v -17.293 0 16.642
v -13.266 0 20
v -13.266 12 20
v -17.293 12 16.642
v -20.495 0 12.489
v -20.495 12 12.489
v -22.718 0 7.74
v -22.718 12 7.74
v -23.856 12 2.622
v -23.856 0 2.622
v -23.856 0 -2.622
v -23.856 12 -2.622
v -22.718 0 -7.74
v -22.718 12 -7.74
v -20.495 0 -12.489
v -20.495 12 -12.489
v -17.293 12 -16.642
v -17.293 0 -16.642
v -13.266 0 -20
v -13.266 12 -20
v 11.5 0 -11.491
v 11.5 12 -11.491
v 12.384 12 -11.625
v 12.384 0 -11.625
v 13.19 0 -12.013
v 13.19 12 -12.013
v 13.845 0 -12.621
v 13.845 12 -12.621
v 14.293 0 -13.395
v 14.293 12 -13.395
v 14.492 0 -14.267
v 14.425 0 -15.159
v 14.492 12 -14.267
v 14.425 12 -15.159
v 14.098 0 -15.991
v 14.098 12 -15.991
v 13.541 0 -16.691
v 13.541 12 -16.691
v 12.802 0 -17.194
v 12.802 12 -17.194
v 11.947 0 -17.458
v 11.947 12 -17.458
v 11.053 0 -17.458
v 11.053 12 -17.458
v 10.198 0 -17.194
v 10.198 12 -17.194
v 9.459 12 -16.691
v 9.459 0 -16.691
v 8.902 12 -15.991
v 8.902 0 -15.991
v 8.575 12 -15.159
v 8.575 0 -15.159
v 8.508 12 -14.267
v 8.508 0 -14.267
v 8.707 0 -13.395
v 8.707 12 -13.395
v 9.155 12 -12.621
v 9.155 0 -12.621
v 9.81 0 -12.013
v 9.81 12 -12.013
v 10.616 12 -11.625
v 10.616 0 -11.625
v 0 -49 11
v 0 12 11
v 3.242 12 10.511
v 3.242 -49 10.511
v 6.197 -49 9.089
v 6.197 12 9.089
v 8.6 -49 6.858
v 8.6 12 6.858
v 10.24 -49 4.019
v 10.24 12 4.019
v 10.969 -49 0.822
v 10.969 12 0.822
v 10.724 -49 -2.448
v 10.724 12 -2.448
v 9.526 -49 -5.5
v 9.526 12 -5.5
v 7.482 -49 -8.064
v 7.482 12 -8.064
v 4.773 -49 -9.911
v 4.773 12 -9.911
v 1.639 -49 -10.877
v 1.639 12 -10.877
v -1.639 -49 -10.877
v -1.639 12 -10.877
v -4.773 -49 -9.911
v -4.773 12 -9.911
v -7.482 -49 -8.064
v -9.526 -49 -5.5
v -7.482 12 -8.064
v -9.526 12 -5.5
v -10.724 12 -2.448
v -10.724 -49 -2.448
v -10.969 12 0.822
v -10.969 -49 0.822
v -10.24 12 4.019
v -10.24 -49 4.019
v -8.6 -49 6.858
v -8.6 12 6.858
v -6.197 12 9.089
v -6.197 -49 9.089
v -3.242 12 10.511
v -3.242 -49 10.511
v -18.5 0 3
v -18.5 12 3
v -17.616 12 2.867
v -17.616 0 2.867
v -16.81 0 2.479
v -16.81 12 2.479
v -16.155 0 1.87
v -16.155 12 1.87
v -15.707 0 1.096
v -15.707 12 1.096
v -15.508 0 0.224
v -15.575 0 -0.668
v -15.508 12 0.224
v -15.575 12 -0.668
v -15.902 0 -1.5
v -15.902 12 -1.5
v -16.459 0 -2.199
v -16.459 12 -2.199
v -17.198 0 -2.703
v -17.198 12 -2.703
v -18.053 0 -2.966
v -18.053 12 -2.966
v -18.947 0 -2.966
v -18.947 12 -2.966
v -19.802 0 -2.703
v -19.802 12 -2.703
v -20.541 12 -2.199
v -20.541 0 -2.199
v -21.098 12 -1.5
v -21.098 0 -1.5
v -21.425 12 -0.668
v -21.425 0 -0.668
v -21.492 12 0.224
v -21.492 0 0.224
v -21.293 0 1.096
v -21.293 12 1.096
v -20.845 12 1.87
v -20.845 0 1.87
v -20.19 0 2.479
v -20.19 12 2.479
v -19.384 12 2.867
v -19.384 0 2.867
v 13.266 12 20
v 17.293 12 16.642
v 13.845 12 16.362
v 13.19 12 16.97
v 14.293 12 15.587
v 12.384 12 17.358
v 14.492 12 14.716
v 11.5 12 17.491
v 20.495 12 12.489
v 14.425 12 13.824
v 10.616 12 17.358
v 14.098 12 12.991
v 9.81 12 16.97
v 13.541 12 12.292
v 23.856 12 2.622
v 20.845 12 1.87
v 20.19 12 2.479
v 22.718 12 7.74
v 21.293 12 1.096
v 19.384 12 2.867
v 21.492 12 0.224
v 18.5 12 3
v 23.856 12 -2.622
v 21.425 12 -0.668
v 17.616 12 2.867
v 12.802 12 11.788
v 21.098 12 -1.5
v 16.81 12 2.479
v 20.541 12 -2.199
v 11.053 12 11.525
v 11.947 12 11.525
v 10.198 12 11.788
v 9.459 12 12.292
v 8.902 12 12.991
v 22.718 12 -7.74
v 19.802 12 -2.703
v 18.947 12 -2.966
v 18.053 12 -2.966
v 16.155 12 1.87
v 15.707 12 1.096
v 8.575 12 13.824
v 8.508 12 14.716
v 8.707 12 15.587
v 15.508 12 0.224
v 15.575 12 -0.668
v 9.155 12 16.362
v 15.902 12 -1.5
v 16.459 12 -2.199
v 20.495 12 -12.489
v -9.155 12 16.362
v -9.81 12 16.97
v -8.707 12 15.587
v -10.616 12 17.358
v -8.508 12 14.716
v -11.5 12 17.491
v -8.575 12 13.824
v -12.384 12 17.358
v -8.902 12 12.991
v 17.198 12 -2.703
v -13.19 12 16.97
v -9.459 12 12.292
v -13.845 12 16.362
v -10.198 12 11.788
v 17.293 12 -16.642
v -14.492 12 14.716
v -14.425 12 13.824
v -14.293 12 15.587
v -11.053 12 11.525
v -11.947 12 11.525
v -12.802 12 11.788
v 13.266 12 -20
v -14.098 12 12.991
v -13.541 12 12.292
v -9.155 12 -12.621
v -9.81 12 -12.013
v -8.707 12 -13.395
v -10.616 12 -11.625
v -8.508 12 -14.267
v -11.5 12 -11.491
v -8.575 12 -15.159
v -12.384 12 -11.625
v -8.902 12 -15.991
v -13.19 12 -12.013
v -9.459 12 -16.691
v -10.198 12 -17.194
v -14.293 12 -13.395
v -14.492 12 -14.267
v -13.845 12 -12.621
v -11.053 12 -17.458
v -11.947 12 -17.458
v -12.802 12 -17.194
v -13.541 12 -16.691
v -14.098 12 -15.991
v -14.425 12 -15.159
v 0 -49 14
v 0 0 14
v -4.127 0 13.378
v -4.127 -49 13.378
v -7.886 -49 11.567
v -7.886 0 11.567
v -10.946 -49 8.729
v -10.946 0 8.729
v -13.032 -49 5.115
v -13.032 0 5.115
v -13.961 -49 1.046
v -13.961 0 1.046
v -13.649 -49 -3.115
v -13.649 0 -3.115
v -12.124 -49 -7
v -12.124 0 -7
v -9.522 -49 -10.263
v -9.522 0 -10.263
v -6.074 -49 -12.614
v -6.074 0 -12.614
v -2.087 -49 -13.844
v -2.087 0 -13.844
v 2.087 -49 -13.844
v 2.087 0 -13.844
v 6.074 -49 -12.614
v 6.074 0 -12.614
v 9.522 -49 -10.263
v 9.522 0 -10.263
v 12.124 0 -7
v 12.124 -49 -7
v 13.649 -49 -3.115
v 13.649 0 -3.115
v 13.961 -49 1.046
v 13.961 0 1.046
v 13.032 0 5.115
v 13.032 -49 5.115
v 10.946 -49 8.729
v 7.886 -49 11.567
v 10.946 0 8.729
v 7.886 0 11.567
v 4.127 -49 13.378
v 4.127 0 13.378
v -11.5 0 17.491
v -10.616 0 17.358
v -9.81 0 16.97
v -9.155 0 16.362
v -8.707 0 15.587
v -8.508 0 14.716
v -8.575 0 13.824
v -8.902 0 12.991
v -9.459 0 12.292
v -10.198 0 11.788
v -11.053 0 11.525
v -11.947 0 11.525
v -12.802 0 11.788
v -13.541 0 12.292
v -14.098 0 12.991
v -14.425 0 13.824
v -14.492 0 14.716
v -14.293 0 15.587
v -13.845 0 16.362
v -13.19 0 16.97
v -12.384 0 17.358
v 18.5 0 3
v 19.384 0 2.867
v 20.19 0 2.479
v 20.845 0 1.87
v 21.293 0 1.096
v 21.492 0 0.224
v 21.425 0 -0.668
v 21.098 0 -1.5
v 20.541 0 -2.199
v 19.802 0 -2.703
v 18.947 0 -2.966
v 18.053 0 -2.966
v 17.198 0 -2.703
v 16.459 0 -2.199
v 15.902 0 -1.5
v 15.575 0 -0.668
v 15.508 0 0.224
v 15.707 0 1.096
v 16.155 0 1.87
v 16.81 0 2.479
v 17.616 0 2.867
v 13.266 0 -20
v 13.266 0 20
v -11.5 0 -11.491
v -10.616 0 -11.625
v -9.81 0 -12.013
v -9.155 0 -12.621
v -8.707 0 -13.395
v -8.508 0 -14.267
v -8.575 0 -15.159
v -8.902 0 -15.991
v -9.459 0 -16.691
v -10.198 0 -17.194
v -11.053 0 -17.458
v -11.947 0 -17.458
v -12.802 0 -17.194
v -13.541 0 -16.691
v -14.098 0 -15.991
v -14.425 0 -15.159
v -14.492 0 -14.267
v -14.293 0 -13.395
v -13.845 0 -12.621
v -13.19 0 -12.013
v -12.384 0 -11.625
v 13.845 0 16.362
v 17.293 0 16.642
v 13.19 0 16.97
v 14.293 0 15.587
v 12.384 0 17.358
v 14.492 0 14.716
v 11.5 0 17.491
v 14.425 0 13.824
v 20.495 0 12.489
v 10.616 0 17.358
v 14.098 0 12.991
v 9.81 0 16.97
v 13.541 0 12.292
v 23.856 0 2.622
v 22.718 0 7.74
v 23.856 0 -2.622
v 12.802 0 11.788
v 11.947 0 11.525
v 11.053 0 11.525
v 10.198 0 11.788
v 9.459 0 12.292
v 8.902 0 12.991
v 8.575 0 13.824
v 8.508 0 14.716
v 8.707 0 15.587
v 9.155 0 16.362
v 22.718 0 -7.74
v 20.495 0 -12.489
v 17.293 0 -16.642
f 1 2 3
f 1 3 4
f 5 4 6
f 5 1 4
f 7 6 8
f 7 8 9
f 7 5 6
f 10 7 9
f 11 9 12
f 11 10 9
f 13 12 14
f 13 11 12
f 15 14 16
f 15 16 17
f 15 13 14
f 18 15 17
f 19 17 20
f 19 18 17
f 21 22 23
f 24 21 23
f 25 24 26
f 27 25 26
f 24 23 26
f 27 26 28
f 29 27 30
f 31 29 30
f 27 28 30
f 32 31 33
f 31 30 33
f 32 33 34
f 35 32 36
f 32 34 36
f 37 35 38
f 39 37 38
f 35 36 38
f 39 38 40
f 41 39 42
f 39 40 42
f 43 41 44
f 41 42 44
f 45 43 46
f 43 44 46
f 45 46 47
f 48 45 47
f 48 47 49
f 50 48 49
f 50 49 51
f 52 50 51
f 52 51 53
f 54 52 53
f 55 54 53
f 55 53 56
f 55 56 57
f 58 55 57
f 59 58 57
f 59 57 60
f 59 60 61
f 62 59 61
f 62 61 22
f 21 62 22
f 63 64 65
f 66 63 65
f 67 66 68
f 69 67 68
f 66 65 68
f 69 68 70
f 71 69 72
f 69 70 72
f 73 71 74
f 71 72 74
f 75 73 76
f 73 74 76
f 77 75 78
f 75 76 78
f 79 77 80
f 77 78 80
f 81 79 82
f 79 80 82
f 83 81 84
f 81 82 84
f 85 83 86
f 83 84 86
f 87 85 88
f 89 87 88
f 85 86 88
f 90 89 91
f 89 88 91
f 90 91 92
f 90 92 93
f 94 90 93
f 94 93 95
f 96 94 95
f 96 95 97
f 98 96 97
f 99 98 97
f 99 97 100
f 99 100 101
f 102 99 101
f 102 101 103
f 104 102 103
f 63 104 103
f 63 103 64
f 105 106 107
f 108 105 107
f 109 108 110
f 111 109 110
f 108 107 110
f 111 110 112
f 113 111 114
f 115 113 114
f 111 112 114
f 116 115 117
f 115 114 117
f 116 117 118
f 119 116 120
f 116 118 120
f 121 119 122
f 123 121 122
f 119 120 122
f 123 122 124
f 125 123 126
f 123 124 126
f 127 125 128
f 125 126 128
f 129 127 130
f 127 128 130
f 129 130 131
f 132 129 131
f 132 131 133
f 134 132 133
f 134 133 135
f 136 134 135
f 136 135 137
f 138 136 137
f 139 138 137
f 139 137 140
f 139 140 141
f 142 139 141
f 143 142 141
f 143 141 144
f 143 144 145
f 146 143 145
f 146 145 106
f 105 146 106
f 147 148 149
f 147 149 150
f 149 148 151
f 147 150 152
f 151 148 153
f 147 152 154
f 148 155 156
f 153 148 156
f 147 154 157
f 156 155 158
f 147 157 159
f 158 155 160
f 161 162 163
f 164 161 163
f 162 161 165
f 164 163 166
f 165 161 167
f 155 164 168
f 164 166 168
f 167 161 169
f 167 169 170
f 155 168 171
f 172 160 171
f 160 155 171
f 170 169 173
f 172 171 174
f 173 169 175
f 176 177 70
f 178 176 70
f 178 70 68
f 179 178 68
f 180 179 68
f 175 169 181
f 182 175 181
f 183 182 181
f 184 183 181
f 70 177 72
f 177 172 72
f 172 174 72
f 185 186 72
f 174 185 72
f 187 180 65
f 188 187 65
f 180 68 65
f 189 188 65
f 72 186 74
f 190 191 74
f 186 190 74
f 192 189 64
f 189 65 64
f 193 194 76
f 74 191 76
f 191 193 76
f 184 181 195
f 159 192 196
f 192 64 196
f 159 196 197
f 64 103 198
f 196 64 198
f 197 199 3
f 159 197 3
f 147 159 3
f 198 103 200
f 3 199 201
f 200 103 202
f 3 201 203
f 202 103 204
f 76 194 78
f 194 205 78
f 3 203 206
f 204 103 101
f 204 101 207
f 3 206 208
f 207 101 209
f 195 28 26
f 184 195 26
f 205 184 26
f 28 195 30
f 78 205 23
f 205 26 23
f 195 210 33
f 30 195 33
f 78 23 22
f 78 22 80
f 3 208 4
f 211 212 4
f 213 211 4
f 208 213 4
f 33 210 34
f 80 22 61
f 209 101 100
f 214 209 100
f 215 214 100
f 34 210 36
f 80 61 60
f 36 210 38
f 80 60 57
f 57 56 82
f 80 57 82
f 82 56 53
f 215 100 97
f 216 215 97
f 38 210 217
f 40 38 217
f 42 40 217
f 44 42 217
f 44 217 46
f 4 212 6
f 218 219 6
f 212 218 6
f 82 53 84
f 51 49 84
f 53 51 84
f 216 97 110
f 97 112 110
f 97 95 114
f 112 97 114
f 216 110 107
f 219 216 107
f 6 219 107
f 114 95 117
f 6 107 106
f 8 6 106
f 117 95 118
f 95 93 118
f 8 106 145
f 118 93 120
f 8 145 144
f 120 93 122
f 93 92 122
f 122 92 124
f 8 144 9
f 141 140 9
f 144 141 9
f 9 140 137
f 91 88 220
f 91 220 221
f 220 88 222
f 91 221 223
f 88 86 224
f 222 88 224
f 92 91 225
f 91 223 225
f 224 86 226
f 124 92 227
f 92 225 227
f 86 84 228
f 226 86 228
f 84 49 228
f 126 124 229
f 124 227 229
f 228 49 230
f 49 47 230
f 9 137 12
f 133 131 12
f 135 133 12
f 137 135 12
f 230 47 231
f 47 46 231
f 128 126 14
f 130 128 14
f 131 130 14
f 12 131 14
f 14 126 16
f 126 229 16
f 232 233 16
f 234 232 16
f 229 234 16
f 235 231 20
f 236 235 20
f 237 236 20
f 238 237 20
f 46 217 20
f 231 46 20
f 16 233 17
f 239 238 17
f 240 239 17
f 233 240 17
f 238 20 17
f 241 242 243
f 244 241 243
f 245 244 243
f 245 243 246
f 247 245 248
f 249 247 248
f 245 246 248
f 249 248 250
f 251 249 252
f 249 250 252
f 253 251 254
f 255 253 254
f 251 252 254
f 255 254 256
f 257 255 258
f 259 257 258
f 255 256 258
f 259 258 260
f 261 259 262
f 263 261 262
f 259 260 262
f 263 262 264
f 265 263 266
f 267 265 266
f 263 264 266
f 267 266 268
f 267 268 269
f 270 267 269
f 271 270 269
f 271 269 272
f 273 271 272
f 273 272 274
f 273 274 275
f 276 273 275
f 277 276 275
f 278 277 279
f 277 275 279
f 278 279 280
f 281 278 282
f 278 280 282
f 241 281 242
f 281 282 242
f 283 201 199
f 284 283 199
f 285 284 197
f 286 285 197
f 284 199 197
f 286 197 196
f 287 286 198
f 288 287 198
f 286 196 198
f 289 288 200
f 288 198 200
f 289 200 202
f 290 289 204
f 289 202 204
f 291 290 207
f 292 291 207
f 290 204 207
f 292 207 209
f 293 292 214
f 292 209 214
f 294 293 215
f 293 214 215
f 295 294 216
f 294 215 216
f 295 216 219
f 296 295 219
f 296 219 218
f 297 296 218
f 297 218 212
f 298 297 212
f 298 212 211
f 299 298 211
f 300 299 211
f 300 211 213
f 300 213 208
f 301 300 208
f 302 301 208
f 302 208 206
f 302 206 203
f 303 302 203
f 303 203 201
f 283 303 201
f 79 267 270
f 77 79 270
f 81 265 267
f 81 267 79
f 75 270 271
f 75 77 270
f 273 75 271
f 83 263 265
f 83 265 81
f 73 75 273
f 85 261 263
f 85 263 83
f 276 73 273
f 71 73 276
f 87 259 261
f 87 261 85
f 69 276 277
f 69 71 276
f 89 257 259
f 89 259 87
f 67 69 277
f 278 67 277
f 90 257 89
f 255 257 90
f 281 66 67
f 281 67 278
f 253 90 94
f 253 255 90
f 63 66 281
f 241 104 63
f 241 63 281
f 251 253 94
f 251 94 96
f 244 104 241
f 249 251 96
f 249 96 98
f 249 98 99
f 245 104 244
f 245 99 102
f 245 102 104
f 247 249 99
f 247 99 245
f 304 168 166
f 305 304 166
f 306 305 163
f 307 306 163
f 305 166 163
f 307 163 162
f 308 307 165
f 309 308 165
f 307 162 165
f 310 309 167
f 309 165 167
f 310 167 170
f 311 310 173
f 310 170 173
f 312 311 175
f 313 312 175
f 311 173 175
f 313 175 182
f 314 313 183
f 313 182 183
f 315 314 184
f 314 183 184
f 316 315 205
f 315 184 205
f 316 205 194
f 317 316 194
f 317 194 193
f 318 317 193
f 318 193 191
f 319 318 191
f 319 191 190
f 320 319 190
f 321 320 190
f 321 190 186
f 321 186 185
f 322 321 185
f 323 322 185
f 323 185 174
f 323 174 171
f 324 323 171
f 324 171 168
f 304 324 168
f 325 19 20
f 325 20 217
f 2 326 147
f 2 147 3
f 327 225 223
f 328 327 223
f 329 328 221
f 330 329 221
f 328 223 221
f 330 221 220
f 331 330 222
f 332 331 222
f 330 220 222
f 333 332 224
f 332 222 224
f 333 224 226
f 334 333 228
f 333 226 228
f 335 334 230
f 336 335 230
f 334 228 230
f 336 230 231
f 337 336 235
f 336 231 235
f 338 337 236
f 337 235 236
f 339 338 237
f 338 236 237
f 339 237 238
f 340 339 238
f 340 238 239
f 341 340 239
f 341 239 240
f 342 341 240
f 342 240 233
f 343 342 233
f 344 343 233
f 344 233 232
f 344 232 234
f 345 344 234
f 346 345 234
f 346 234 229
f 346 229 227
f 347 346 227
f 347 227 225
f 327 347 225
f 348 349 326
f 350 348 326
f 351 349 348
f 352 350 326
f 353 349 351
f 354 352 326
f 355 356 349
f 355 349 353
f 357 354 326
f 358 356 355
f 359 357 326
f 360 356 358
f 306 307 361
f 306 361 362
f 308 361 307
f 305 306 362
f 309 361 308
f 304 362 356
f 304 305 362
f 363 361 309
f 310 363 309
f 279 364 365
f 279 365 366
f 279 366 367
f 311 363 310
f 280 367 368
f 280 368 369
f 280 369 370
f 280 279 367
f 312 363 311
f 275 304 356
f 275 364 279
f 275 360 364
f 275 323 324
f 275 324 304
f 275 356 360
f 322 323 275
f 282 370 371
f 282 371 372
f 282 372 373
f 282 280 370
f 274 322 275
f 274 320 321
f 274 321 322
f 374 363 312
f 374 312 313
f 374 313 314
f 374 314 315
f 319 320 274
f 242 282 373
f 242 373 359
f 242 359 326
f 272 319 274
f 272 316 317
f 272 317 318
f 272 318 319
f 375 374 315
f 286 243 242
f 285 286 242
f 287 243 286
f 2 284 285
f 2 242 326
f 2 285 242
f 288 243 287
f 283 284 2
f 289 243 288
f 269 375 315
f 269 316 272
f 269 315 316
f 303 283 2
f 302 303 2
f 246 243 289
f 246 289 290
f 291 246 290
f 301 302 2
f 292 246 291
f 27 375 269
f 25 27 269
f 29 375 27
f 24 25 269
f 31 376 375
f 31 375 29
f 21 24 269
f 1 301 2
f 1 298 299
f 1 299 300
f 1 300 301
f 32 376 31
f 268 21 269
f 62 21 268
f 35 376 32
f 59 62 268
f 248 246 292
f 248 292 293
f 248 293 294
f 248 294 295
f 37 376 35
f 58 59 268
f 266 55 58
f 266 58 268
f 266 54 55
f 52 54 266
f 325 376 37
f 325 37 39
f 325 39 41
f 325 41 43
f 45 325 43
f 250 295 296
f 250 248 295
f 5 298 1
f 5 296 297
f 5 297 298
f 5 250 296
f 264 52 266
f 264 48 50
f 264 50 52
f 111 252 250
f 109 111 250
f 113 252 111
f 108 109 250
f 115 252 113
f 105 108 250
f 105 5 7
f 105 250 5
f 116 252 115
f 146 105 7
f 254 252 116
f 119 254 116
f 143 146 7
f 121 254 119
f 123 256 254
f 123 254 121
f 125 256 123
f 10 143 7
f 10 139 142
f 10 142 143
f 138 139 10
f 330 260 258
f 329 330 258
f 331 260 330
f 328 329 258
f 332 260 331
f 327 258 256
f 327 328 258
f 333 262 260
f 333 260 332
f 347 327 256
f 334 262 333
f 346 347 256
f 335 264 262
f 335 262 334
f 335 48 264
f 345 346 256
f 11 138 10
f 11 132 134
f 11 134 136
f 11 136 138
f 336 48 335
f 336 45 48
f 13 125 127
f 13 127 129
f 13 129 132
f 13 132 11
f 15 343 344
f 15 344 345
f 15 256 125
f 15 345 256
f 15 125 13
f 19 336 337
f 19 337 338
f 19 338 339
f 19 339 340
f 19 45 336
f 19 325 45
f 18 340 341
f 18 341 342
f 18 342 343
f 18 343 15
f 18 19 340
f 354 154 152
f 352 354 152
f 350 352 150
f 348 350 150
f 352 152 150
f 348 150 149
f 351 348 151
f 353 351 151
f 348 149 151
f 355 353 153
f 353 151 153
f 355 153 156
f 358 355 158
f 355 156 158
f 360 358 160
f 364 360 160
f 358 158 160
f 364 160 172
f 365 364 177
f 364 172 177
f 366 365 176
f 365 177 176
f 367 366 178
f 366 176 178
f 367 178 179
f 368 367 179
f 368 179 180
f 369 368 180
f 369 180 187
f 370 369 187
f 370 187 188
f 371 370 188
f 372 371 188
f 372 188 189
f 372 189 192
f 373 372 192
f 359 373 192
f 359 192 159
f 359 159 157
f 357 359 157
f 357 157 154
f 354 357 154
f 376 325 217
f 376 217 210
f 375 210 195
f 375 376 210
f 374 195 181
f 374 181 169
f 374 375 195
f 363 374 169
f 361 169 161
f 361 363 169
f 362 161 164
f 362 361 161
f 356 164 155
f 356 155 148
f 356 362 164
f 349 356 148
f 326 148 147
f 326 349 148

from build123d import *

# Parameters (mm, degrees)
BOSS_EXTRUDE1_DEPTH = 12
SKETCH2_R           = 14
BOSS_EXTRUDE2_DEPTH = 49
SKETCH3_R           = 11
SKETCH3_R_2         = 3
CUT_EXTRUDE1_DEPTH  = 69.534662763


with BuildPart() as part:
    # Sketch1 → Boss-Extrude1 (new body)
    with BuildSketch(Plane(origin=(0, 0, 0), x_dir=(1, 0, 0), z_dir=(0, 1, 0))):
        with BuildLine():
            Line((0, 20), (13.266499161, 20))
            ThreePointArc((13.266499161, 20), (24, 0), (13.266499161, -20))
            Line((13.266499161, -20), (-13.266499161, -20))
            ThreePointArc((-13.266499161, -20), (-24, 0), (-13.266499161, 20))
            Line((-13.266499161, 20), (0, 20))
        make_face()
    extrude(amount=BOSS_EXTRUDE1_DEPTH)

    # Sketch2 → Boss-Extrude2 (add)
    with BuildSketch(Plane.XZ):
        with Locations(Location((0, 0, 0), (0, 0, 90))):
            Circle(SKETCH2_R)
    extrude(amount=BOSS_EXTRUDE2_DEPTH)

    # Sketch3 → Cut-Extrude1 (cut, through all)
    with BuildSketch(Plane(origin=(0, 12, 0), x_dir=(1, 0, 0), z_dir=(0, 1, 0))):
        with Locations(Location((0, 0, 0), (0, 0, 270))):
            Circle(SKETCH3_R)
        with Locations(Location((-11.5, 14.491376746, 0), (0, 0, 270))):
            Circle(SKETCH3_R_2)
        with Locations(Location((-18.5, 0, 0), (0, 0, 270))):
            Circle(SKETCH3_R_2)
        with Locations(Location((-11.5, -14.491376746, 0), (0, 0, 270))):
            Circle(SKETCH3_R_2)
        with Locations(Location((11.5, -14.491376746, 0), (0, 0, 270))):
            Circle(SKETCH3_R_2)
        with Locations(Location((18.5, 0, 0), (0, 0, 270))):
            Circle(SKETCH3_R_2)
        with Locations(Location((11.5, 14.491376746, 0), (0, 0, 270))):
            Circle(SKETCH3_R_2)
    extrude(amount=-CUT_EXTRUDE1_DEPTH, mode=Mode.SUBTRACT)


solid = part.part
